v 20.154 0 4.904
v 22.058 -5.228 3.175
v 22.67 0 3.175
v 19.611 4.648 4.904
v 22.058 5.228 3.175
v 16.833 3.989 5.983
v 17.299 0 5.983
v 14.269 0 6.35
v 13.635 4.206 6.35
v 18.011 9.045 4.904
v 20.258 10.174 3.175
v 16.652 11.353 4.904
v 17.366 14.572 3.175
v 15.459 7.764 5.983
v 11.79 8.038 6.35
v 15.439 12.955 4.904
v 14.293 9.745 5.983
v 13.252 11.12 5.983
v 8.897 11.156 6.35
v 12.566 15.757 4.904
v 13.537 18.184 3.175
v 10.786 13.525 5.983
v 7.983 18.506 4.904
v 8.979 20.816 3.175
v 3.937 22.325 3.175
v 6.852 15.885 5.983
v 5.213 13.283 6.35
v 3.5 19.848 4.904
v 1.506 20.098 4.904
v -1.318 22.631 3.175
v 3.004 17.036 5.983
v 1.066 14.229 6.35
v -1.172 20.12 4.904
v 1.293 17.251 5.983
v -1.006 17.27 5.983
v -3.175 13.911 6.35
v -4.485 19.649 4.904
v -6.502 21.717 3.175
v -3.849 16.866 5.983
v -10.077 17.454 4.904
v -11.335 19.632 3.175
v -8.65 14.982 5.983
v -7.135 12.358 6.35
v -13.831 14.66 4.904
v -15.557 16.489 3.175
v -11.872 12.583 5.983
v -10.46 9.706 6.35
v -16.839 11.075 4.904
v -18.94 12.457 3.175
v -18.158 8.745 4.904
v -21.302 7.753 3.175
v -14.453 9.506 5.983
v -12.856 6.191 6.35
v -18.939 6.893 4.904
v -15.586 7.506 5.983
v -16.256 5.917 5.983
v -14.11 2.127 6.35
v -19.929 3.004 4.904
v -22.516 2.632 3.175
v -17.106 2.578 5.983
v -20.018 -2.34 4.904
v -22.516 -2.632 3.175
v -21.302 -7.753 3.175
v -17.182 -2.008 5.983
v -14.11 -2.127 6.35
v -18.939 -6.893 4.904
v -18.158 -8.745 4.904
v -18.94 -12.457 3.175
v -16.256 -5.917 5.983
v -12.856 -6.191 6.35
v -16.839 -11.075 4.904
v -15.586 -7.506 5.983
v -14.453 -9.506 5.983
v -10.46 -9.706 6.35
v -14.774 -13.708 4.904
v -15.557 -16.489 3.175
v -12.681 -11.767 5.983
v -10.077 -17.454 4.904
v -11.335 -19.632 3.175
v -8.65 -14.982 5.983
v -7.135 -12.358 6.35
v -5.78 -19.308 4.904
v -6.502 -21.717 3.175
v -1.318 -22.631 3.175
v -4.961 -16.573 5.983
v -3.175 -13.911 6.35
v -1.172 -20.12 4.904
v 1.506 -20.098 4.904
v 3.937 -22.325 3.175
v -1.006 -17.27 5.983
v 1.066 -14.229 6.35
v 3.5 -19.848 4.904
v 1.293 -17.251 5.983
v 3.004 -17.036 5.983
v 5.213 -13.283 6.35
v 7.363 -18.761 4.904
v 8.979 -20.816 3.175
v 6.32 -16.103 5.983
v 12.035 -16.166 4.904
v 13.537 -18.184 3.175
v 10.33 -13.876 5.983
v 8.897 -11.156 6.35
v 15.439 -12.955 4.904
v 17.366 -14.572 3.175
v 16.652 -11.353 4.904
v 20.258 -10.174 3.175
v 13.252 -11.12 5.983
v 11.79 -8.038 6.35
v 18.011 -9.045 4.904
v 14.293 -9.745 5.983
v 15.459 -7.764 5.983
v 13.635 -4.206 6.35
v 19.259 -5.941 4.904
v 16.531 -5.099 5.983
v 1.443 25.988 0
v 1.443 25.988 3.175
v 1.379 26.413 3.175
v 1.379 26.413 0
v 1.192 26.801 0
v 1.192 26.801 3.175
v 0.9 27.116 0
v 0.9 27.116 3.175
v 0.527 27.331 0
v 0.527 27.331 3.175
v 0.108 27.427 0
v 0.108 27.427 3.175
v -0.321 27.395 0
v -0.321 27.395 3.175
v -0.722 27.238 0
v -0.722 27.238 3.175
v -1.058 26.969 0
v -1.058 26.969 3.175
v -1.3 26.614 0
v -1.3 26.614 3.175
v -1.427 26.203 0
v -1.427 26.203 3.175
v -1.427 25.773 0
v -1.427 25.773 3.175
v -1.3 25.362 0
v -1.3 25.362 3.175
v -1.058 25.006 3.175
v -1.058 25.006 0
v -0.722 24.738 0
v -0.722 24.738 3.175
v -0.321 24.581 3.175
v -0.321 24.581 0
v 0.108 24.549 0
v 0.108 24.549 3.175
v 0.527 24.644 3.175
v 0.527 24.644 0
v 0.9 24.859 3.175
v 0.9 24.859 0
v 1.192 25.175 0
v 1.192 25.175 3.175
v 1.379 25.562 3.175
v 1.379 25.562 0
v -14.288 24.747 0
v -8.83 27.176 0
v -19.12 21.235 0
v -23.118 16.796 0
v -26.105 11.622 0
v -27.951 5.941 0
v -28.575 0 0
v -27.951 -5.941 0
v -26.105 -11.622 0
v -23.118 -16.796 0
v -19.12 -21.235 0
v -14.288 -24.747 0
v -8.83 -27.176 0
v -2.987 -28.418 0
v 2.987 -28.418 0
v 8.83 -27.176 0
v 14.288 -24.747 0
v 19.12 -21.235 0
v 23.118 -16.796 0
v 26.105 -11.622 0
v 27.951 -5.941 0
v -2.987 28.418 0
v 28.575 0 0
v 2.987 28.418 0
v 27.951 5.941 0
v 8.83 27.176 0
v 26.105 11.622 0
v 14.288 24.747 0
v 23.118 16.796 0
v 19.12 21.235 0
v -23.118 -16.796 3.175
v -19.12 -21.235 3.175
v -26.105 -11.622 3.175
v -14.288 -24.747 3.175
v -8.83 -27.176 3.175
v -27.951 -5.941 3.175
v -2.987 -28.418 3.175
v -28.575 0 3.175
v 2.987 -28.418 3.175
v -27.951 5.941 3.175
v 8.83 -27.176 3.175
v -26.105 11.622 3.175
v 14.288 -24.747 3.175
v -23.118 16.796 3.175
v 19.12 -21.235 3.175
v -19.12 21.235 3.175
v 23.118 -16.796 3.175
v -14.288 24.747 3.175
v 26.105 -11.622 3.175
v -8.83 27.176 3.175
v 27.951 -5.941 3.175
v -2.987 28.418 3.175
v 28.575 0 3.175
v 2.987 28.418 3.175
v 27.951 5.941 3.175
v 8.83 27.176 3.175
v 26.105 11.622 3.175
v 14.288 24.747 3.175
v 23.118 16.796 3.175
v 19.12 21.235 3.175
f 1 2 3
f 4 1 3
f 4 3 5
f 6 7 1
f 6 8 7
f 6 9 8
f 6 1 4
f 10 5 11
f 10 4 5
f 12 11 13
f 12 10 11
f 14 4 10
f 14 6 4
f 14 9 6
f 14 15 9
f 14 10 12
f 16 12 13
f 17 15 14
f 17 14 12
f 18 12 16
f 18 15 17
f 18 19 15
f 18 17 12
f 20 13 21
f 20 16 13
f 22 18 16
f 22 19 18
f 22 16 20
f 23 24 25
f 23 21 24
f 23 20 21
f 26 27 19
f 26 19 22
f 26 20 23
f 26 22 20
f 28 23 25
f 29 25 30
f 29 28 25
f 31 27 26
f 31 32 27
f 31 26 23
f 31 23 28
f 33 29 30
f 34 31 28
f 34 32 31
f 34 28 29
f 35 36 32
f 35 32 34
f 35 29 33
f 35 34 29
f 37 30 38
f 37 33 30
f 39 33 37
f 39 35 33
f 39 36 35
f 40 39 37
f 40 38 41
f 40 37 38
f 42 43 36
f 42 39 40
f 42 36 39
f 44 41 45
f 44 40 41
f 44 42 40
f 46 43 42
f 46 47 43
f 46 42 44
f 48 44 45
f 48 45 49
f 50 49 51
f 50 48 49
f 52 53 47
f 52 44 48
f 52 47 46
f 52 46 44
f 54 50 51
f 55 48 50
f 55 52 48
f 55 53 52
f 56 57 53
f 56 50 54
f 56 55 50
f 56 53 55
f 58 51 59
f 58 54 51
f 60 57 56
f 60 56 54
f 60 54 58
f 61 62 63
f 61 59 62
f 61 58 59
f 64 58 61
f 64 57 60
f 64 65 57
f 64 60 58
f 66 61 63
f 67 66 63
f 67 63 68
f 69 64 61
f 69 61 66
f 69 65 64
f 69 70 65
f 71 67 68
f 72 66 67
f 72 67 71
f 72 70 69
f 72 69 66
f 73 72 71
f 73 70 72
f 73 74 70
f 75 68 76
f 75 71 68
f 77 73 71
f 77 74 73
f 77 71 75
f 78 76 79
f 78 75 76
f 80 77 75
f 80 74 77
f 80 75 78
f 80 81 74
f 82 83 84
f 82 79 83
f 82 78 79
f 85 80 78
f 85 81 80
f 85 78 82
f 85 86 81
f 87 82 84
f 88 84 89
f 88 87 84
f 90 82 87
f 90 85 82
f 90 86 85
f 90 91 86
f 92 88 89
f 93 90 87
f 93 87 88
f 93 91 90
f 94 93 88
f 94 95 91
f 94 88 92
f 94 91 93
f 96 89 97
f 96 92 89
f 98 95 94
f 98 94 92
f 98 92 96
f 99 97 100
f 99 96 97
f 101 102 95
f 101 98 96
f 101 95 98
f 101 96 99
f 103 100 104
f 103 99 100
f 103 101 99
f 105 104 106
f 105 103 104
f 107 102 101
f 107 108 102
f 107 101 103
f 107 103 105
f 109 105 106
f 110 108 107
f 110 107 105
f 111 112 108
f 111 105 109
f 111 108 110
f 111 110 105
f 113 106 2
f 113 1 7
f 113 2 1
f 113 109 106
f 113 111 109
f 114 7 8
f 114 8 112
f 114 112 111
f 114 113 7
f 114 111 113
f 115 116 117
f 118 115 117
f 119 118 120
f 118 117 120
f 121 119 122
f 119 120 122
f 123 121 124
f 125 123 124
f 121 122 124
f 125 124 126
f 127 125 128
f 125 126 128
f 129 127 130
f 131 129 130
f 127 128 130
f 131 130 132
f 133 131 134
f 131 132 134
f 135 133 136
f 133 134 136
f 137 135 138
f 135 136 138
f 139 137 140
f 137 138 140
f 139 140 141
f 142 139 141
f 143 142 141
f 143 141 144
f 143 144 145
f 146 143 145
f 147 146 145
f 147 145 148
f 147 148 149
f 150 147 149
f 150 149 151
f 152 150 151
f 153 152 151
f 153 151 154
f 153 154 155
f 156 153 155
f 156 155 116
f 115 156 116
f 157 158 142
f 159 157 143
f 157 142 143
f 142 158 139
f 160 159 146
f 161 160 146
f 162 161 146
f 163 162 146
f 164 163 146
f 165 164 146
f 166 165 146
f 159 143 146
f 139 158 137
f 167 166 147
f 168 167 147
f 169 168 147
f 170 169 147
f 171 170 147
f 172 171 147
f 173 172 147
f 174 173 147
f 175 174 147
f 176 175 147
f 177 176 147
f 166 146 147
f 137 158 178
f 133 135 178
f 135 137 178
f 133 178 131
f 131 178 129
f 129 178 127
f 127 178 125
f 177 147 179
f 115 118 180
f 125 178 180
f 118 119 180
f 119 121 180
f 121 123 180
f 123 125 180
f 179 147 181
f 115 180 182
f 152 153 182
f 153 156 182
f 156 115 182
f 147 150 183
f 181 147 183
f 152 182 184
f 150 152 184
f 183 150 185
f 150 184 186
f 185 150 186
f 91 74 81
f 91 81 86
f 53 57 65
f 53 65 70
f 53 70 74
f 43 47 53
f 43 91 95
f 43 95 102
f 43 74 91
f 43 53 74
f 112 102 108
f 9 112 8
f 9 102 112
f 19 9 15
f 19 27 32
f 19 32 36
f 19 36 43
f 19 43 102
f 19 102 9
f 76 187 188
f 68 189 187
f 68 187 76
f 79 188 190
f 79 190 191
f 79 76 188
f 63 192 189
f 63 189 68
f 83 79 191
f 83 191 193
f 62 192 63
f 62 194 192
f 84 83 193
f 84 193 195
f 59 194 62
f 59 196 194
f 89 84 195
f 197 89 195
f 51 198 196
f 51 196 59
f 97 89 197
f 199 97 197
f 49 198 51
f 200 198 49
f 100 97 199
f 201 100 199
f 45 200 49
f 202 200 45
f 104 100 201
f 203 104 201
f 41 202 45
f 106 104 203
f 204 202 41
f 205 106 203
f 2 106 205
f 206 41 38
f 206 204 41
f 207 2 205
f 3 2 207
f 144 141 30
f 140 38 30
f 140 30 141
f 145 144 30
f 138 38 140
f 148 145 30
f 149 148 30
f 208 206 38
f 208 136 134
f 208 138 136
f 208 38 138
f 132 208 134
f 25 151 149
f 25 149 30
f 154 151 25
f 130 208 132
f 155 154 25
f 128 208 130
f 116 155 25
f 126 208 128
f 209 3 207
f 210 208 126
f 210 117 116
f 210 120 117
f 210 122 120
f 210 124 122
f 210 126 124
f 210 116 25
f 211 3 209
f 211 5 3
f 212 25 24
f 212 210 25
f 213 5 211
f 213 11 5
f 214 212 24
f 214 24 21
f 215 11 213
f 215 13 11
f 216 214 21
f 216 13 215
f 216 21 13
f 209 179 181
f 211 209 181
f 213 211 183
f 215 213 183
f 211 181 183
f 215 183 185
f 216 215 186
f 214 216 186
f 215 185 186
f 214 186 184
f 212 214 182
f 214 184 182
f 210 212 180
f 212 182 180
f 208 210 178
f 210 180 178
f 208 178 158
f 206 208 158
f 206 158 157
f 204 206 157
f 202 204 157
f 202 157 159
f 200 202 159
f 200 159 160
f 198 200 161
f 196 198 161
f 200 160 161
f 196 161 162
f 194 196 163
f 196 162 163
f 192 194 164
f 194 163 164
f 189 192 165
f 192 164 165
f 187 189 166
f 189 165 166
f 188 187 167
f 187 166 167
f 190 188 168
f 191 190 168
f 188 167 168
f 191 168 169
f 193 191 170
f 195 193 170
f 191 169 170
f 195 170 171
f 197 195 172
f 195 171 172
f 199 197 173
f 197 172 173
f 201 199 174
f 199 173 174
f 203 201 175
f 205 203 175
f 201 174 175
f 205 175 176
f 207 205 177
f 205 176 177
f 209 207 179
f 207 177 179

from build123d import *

# Parameters (mm, degrees)
F0_R     = 28.575
F2_DEPTH = 3.175
F1_R     = 22.6695
F3_DEPTH = 6.35
F4_R     = 1.4432349382
F5_DEPTH = 6.351


# Not quite as in the source:
# - a fillet or chamfer that OpenCascade refuses, or shapes differently, is made with other operations: its cross-section is extruded or revolved along the edge and cut away or added


with BuildPart() as f2:
    # F0 (on Top) → F2 (new body)
    with BuildSketch(Plane.XY):
        Circle(F0_R)
    extrude(amount=F2_DEPTH)

    # F1 (on Top) → F3 (join)
    with BuildSketch(Plane.XY):
        Circle(F1_R)
    extrude(amount=F3_DEPTH)

    # F4 (on face) → F5 (cut, through all)
    with BuildSketch(Plane.XY.offset(6.35)):
        with Locations((0, 25.9878132492)):
            Circle(F4_R)
    extrude(amount=-F5_DEPTH, mode=Mode.SUBTRACT)

    # F6: fillet of radius 12.7 on 1 edges, made by hand

    # F6_s1 → F6_t2 (revolve, cut)
    with BuildSketch(Plane.XZ):
        with BuildLine():
            ThreePointArc((22.6695, 3.175), (18.7593676479, 5.529762203), (14.2692395874, 6.35))
            Line((14.2692395874, 6.35), (14.2692395874, 6.604))
            Line((14.2692395874, 6.604), (22.6695, 6.604))
            Line((22.6695, 6.604), (22.9235, 6.35))
            ThreePointArc((22.9235, 6.35), (22.9235, 4.7625), (22.8375052083, 3.3655))
            Line((22.8375052083, 3.3655), (22.6695, 3.175))
        make_face()
    revolve(axis=Axis((0, 0, 6.35), (0, 0, 1)), mode=Mode.SUBTRACT)


solid = f2.part
